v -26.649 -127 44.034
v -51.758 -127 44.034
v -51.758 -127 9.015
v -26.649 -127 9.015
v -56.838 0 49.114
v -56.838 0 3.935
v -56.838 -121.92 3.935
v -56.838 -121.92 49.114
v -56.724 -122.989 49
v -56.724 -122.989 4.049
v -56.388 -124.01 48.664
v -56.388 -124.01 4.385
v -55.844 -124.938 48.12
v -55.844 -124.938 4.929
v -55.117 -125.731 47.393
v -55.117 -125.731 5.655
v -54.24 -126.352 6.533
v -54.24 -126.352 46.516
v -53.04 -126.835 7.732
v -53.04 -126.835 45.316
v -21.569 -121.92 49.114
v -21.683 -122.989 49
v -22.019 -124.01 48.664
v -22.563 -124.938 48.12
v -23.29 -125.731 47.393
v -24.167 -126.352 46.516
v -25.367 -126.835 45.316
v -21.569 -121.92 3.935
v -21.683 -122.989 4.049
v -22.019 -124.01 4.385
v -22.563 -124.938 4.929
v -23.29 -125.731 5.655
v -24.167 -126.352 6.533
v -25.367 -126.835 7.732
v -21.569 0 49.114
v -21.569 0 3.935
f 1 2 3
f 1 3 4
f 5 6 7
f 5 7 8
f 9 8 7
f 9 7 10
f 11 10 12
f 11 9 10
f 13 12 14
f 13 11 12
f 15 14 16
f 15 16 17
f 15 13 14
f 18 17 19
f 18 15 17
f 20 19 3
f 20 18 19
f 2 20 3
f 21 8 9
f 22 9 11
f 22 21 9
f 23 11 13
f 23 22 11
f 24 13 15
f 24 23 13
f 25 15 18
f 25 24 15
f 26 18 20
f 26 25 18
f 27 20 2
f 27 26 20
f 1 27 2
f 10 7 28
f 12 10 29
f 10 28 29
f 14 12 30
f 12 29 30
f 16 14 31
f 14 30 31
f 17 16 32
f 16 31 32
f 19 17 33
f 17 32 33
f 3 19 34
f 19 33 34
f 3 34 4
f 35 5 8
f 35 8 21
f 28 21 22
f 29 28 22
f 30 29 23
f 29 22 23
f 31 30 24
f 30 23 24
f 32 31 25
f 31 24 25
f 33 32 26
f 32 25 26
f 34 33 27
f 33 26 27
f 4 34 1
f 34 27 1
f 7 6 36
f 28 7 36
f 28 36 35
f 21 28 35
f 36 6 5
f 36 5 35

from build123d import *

# Parameters (mm, degrees)
F0_W     = 35.268522799
F0_H     = 45.1786872
F1_DEPTH = 76.2
F2_DEPTH = 50.8
F3_R     = 5.08


with BuildPart() as f1:
    # F0 (on Front) → F1 (new body)
    with BuildSketch(Plane.XZ):
        with Locations((-39.2034426332, 26.5242615715)):
            Rectangle(F0_W, F0_H)
    extrude(amount=F1_DEPTH)

    # F2 (add): a face of the model
    f2_faces = [f1.faces().sort_by_distance(p)[0] for p in [
        (-39.2034426332, -76.2, 26.5242615715),
    ]]
    extrude(f2_faces, amount=F2_DEPTH)

    # F3
    f3_edges = [f1.edges().sort_by_distance(p)[0] for p in [
        (-39.203443, -127, 49.113605),
        (-56.837704, -127, 26.524262),
        (-39.203443, -127, 3.934918),
        (-21.569181, -127, 26.524262),
    ]]
    fillet(f3_edges, radius=F3_R)


solid = f1.part
